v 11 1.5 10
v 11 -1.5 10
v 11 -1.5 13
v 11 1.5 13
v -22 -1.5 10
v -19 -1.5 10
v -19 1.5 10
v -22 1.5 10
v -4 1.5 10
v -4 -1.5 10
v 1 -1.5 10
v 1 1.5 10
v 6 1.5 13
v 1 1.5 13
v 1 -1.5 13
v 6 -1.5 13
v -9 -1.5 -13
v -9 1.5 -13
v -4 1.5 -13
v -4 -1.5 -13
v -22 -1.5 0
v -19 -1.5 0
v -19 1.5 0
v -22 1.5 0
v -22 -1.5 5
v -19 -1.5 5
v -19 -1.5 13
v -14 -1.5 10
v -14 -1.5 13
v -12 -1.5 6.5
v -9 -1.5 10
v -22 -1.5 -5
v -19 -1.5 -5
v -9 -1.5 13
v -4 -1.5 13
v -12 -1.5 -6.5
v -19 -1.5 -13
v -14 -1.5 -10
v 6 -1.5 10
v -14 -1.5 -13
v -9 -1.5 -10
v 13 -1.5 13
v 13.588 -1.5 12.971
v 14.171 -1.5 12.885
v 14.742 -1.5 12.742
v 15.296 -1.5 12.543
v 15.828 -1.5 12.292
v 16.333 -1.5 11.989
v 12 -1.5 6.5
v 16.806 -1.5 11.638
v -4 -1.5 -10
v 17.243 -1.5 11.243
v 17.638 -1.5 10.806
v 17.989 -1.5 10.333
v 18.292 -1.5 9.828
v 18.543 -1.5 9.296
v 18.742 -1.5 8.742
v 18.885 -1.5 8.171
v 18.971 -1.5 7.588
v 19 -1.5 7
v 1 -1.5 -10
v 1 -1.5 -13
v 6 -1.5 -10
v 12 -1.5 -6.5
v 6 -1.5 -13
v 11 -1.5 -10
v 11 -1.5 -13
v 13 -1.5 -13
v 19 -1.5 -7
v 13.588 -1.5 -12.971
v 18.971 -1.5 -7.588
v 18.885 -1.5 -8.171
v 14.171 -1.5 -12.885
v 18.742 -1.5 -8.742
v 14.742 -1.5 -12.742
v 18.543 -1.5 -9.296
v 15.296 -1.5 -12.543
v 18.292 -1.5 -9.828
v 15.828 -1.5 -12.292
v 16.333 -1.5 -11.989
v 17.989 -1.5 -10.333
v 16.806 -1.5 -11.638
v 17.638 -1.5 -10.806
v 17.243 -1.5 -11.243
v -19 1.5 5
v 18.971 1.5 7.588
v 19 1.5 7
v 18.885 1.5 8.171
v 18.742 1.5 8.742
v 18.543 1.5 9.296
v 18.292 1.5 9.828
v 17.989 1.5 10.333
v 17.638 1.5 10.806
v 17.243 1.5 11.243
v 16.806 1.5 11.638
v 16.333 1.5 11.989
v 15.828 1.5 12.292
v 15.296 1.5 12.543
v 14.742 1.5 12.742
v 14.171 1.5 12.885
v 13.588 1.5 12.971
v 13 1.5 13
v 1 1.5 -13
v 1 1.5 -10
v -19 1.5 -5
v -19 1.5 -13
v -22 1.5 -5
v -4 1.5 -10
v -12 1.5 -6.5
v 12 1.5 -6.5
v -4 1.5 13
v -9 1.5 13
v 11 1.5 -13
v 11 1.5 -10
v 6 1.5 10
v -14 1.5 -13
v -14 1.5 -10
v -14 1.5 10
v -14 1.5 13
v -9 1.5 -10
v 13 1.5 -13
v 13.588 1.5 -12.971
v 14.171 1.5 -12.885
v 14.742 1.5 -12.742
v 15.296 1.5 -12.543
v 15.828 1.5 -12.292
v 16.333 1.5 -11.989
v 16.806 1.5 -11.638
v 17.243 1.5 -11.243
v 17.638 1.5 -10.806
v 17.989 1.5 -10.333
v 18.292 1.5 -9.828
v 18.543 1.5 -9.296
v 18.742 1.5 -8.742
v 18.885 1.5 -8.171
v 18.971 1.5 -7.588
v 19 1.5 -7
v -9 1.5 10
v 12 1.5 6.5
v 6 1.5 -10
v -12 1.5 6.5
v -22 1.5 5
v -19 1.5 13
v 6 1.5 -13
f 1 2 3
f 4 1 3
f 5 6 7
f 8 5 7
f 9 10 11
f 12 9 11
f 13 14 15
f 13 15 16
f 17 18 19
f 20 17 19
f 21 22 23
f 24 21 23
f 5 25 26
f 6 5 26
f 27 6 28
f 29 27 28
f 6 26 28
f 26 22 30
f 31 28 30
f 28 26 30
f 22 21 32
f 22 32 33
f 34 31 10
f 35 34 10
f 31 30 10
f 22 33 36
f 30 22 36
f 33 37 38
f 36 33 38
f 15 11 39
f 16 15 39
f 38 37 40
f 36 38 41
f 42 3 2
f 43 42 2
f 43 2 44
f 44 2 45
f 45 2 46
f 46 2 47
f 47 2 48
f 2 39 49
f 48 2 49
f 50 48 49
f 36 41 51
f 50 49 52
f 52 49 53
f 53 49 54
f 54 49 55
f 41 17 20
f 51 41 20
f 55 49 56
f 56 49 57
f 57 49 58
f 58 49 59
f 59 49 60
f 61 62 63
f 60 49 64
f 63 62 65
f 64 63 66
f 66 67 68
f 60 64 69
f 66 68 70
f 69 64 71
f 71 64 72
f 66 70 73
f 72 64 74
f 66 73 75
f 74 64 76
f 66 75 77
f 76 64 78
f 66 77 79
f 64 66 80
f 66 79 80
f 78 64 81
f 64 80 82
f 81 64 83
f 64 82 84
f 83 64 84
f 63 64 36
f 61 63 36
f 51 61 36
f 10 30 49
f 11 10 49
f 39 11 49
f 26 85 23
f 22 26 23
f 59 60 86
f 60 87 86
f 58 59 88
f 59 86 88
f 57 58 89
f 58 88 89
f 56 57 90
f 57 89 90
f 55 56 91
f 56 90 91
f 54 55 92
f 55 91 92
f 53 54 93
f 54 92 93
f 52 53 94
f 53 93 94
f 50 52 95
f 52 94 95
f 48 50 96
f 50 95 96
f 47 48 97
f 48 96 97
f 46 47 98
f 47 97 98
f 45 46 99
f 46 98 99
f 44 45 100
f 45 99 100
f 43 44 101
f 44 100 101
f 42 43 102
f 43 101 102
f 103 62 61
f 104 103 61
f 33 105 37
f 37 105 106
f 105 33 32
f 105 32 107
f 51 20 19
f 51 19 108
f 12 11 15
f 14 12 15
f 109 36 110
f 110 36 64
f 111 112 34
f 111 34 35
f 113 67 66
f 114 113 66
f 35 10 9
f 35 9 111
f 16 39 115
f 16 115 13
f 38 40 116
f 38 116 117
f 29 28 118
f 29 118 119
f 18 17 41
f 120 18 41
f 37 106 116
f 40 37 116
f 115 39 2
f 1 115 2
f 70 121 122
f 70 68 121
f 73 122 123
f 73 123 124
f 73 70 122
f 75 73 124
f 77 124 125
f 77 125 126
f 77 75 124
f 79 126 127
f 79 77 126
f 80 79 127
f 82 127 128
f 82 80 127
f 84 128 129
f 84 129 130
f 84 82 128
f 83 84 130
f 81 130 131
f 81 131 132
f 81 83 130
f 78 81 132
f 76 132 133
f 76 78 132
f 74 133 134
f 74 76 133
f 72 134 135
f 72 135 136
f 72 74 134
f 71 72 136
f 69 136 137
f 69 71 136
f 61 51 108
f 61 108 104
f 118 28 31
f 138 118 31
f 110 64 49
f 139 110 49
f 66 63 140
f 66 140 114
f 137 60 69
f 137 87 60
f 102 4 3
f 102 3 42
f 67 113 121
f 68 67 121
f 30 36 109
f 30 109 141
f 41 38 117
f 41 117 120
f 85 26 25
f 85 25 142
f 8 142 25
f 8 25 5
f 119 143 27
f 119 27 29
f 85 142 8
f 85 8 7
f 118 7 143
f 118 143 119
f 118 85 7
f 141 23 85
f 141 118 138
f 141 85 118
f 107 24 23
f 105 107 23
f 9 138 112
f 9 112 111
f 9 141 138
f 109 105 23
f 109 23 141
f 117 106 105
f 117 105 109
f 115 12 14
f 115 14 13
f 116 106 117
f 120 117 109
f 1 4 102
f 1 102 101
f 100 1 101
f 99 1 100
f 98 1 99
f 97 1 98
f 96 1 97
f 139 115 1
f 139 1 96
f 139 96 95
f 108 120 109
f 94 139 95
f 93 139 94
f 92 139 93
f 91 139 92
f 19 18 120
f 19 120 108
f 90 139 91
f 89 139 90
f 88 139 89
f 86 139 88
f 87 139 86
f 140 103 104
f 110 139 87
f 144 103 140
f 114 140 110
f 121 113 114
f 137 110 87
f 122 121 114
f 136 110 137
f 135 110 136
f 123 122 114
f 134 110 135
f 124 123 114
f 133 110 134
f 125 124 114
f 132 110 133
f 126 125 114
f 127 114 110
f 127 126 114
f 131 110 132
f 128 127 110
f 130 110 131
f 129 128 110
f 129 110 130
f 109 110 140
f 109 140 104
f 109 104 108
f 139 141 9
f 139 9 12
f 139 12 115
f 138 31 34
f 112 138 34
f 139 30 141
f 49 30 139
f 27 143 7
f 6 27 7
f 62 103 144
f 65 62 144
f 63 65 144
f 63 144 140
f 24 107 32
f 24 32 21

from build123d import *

# Parameters (mm, degrees)
SKETCH1_W           = 38
SKETCH1_H           = 26
BOSS_EXTRUDE1_DEPTH = 1.5
SKETCH2_W           = 24
SKETCH2_H           = 13
CUT_EXTRUDE1_DEPTH  = 3
SKETCH8_W           = 5
SKETCH8_H           = 3
BOSS_EXTRUDE2_DEPTH = 3
SKETCH9_W           = 5
SKETCH9_H           = 3
CUT_EXTRUDE2_DEPTH  = 3
FILLET1_R           = 6


with BuildPart() as part:
    # Sketch1 → Boss-Extrude1 (new body, symmetric)
    with BuildSketch(Plane(origin=(0, 0, 0), x_dir=(1, 0, 0), z_dir=(0, 1, 0))):
        Rectangle(SKETCH1_W, SKETCH1_H)
    extrude(amount=BOSS_EXTRUDE1_DEPTH, both=True)

    # Sketch2 → Cut-Extrude1 (cut)
    with BuildSketch(Plane.XZ.offset(1.5)):
        Rectangle(SKETCH2_W, SKETCH2_H)
    extrude(amount=-CUT_EXTRUDE1_DEPTH, mode=Mode.SUBTRACT)

    # Sketch8 → Boss-Extrude2 (add)
    with BuildSketch(Plane.ZY.offset(19)):
        with Locations((-2.5, 0)):
            Rectangle(SKETCH8_W, SKETCH8_H)
        with Locations((7.5, 0)):
            Rectangle(SKETCH8_W, SKETCH8_H)
    extrude(amount=BOSS_EXTRUDE2_DEPTH)

    # Sketch9 → Cut-Extrude2 (cut)
    with BuildSketch(Plane.XZ.offset(1.5)):
        with Locations((-11.5, -11.5)):
            Rectangle(SKETCH9_W, SKETCH9_H)
        with Locations((-11.5, 11.5)):
            Rectangle(SKETCH9_W, SKETCH9_H)
        with Locations((-1.5, -11.5)):
            Rectangle(SKETCH9_W, SKETCH9_H)
        with Locations((-1.5, 11.5)):
            Rectangle(SKETCH9_W, SKETCH9_H)
        with Locations((8.5, -11.5)):
            Rectangle(SKETCH9_W, SKETCH9_H)
        with Locations((8.5, 11.5)):
            Rectangle(SKETCH9_W, SKETCH9_H)
    extrude(amount=-CUT_EXTRUDE2_DEPTH, mode=Mode.SUBTRACT)

    # Fillet1
    fillet1_edges = [part.edges().sort_by_distance(p)[0] for p in [
        (19, 0, 13),
        (19, 0, -13),
    ]]
    fillet(fillet1_edges, radius=FILLET1_R)


solid = part.part
